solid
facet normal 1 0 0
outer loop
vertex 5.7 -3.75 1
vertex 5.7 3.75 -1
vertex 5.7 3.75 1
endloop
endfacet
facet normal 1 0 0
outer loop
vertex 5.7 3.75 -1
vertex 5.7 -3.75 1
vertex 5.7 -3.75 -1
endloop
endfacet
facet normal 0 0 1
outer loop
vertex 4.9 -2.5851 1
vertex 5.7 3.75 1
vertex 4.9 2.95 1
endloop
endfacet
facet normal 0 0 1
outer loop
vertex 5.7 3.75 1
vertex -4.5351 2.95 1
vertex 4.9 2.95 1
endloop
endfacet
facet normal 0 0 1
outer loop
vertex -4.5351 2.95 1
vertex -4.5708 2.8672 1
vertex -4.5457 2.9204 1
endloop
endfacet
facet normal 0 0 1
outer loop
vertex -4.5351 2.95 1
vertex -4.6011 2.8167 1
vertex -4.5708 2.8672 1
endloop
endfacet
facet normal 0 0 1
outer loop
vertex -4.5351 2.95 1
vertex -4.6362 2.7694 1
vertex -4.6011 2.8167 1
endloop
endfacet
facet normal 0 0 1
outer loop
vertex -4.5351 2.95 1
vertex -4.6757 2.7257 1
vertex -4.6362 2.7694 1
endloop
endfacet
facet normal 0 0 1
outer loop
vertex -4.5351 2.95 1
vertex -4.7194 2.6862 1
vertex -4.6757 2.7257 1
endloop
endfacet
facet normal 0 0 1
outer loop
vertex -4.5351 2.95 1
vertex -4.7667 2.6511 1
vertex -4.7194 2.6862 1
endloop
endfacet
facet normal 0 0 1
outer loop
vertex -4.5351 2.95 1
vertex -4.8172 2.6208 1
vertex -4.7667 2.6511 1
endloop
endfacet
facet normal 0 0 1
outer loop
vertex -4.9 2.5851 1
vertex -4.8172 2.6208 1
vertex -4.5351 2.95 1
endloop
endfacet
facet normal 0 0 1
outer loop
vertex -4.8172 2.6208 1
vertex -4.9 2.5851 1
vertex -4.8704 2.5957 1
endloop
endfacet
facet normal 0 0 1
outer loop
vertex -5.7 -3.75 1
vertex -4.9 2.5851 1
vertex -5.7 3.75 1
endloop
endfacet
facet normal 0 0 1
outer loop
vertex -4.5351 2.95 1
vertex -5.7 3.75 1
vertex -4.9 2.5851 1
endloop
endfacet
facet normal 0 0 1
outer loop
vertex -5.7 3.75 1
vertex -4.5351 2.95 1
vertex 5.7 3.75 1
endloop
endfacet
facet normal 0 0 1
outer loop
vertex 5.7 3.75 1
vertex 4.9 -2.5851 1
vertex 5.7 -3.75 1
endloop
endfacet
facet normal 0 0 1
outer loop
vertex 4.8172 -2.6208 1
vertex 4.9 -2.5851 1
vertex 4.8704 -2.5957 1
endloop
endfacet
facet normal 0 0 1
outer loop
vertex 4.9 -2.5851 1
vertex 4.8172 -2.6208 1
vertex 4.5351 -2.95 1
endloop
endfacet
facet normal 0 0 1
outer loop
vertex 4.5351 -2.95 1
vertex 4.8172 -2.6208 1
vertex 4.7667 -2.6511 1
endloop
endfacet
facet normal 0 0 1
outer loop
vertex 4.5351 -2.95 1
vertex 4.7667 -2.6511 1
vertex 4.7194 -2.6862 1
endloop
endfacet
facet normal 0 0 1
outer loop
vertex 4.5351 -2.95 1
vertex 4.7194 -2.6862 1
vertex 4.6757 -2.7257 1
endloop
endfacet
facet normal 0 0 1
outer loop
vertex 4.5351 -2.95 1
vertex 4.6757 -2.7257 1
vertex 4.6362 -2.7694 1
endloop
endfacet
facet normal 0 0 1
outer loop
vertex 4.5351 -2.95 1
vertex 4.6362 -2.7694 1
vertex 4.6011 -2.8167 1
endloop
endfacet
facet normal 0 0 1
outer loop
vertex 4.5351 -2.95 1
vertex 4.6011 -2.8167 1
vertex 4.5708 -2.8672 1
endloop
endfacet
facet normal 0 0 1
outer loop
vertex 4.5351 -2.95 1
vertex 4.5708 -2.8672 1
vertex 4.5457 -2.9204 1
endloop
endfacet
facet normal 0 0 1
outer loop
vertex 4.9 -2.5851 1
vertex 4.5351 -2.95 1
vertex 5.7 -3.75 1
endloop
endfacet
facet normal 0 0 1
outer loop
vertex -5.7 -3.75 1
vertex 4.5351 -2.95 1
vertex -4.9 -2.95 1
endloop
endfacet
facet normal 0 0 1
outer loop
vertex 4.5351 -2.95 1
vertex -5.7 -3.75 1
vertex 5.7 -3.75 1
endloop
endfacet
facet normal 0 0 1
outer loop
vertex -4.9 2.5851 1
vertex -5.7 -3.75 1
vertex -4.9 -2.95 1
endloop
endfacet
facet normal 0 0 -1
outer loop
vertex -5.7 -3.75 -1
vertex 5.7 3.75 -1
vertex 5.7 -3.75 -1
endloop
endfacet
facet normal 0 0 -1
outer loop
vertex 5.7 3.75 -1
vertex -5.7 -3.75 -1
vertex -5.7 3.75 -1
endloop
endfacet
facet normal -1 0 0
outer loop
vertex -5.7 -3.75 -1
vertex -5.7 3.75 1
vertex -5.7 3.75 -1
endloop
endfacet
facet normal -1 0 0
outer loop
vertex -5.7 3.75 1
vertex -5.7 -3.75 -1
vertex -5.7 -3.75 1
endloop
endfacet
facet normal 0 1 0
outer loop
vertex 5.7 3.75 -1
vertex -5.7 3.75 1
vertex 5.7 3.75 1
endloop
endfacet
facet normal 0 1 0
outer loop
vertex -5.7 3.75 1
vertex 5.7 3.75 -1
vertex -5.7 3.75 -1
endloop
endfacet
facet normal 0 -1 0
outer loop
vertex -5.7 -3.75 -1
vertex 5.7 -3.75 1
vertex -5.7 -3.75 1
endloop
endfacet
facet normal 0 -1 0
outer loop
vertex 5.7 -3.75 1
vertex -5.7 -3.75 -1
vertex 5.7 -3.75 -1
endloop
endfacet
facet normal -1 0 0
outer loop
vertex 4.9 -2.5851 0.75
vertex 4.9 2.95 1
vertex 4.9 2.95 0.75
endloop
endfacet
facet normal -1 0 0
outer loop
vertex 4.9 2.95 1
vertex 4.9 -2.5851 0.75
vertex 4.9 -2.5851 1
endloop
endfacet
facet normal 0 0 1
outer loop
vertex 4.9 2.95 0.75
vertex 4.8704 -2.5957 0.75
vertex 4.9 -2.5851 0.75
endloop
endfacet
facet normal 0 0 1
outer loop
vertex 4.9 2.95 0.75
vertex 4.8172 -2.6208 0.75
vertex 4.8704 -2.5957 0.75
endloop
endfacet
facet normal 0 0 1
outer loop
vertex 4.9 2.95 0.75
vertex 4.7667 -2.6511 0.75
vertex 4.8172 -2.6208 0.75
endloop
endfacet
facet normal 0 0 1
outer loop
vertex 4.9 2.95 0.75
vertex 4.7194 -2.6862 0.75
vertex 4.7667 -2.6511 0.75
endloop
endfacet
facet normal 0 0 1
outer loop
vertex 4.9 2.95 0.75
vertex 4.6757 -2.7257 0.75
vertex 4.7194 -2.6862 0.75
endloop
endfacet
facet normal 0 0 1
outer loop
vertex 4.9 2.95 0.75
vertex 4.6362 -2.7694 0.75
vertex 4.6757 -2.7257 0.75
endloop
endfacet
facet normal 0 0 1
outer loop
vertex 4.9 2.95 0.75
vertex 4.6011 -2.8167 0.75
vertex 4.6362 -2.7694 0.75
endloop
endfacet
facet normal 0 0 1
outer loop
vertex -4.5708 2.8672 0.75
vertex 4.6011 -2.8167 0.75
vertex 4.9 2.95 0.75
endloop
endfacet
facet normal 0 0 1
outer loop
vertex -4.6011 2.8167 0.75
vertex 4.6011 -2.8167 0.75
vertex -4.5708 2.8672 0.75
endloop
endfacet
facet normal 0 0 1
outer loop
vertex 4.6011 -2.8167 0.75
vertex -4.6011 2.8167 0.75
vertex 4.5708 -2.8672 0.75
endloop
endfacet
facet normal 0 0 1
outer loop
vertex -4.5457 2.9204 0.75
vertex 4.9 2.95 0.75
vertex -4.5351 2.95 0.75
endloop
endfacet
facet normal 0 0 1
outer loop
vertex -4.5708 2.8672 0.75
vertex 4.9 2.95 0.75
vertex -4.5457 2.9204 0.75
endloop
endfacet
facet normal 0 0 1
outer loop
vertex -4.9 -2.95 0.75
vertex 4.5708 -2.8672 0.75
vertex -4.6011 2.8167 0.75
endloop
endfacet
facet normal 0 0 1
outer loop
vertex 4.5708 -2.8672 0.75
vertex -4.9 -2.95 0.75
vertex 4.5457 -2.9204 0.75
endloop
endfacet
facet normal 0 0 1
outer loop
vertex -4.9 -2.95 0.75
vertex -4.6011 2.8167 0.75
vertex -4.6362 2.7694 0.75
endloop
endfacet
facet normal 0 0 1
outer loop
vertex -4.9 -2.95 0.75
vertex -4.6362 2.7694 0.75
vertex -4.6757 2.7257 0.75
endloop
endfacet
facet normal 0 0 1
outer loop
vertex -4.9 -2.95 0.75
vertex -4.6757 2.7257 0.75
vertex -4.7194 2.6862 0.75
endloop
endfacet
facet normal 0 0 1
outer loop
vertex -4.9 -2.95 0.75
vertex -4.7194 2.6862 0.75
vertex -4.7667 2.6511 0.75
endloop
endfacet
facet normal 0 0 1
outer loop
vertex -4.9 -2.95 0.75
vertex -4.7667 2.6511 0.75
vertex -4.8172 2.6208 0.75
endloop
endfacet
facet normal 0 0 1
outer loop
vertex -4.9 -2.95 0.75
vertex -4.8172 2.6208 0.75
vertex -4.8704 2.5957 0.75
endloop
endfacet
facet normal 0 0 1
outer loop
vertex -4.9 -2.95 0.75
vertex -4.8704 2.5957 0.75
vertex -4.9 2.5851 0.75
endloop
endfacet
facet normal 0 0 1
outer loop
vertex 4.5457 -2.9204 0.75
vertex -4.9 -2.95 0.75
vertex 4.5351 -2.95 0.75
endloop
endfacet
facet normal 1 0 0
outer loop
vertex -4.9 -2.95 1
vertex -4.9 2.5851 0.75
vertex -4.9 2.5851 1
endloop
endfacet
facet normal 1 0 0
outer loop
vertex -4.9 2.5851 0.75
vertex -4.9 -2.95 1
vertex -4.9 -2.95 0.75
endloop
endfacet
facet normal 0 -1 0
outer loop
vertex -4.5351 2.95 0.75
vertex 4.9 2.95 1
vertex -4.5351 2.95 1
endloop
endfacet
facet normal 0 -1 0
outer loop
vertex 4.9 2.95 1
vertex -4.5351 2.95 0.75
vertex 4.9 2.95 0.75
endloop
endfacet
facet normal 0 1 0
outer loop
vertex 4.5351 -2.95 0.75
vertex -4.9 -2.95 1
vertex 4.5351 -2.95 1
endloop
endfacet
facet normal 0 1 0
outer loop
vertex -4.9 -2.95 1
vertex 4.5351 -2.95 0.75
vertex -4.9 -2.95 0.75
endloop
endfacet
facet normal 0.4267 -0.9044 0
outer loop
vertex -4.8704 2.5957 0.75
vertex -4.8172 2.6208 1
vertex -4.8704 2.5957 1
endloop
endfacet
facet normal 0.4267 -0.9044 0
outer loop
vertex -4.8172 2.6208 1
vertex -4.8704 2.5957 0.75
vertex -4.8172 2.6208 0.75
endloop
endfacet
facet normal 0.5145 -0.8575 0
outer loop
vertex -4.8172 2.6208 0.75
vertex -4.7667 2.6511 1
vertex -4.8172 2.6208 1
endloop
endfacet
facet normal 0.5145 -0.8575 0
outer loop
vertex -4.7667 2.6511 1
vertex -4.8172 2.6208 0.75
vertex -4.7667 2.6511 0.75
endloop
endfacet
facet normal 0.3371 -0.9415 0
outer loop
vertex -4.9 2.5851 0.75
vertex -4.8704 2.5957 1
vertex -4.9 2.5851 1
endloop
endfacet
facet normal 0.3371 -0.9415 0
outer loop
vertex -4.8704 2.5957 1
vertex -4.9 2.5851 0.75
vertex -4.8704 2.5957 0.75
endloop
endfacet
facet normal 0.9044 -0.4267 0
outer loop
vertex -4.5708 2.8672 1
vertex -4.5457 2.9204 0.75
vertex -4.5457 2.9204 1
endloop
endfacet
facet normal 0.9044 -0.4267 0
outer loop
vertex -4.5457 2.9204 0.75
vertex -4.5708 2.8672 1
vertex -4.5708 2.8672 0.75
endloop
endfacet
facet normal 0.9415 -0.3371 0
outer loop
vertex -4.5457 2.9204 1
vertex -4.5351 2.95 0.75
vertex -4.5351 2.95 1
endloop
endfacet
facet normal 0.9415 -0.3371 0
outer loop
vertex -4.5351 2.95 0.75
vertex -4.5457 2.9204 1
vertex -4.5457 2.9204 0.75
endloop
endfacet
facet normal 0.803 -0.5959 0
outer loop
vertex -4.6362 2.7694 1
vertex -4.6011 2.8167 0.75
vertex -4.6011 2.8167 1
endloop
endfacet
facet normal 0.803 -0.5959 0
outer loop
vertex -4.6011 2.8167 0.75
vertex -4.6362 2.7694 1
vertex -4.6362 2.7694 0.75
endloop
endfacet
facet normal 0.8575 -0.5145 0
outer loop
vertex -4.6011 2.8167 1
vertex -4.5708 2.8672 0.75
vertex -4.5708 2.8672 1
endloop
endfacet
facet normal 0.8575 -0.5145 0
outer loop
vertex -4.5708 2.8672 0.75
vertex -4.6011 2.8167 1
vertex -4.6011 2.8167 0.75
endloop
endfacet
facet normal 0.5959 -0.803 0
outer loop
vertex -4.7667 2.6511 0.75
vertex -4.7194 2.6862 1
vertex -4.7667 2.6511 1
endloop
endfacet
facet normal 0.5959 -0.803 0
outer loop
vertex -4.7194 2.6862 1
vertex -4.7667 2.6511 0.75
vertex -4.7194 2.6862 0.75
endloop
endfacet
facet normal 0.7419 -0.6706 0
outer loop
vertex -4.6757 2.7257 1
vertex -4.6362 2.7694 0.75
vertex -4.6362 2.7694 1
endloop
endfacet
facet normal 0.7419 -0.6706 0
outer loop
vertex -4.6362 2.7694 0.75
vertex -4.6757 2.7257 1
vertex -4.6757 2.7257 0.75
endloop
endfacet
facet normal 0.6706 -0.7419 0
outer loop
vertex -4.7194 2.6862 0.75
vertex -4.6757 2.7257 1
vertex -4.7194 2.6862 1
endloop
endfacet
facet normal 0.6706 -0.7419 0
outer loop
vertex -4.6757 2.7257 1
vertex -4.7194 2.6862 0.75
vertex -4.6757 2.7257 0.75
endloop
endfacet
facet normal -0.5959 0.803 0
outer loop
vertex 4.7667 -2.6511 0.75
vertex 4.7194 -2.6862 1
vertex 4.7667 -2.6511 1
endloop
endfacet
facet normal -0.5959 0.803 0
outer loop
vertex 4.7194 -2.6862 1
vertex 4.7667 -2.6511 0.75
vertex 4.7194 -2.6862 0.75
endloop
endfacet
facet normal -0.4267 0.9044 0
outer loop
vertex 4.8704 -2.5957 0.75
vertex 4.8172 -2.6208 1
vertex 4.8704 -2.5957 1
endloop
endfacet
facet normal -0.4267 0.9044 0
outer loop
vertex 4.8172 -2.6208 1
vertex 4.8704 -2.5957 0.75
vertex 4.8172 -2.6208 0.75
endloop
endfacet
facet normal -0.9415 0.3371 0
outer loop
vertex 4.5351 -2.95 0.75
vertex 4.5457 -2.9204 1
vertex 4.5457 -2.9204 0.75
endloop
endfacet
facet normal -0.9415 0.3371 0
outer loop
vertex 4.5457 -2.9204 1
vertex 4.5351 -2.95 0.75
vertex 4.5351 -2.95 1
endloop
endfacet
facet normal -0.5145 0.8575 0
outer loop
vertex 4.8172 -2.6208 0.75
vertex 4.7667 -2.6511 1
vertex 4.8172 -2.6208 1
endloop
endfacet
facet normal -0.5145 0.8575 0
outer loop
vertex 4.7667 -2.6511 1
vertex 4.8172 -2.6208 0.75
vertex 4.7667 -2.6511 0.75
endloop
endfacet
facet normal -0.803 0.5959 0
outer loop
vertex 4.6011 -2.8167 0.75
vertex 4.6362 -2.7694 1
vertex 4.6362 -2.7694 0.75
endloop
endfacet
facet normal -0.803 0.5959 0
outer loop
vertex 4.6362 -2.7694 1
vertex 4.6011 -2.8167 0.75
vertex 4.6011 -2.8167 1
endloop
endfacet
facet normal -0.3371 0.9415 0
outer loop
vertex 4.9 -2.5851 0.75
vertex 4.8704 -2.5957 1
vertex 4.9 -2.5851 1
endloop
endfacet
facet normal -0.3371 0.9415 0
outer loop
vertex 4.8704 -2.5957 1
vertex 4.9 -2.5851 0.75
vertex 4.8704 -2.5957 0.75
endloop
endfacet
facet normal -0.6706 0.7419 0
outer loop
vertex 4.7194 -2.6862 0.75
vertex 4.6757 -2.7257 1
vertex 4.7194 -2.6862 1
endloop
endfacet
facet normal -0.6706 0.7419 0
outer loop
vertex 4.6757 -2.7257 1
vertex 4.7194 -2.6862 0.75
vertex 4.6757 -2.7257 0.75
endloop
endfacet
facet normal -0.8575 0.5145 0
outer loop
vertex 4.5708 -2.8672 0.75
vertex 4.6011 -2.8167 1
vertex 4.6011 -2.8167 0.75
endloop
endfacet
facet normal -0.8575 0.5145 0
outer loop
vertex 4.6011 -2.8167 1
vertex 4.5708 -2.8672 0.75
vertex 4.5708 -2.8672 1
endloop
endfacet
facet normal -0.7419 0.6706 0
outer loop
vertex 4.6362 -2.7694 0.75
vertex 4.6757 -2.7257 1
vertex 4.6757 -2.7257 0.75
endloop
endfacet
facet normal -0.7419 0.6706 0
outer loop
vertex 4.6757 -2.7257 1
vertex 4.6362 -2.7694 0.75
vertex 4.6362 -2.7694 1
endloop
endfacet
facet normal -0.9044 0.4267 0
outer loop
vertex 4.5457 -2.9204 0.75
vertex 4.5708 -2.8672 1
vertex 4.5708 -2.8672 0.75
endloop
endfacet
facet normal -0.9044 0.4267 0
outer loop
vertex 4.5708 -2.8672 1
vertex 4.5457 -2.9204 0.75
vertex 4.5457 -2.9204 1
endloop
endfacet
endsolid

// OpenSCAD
// SMD package target overall: [11.40, 7.50, 2.00] (L x W x H)
// One connected solid. Simple body + two end terminations + two corner bumps (as seen in orthographic views).

// ---------- Parameters ----------
L = 11.40;
W = 7.50;
H = 2.00;

// Inner "top" inset (visual feature seen in side/front/back/left/right views)
inset_margin = 0.80;     // frame thickness around inset
inset_depth  = 0.25;     // depth of inset from top surface

// End terminations (kept within overall length; no protrusion beyond L)
term_len   = 1.60;       // along X
term_w     = 6.20;       // along Y
term_thk   = 0.25;       // along Z (bottom pads)

// Corner bumps (small circular protrusions seen in views)
bump_r = 0.60;
bump_h = 0.25;           // height of bump (kept within overall height)

// Connectivity overlap (ensures single connected solid)
overlap = 0.20;
eps = 0.02;
$fn = 64;

// ---------- Helpers ----------
function clamp(v, lo, hi) = v < lo ? lo : (v > hi ? hi : v);

// Inset size (must remain positive)
inset_L = clamp(L - 2*inset_margin, 0.1, L);
inset_W = clamp(W - 2*inset_margin, 0.1, W);
inset_depth_c = clamp(inset_depth, 0, H);

// Termination placement (fully inside overall length)
term_xL = -L/2 + term_len/2;
term_xR =  L/2 - term_len/2;

// Bottom pad Z placement: slightly overlaps into body
term_z = -H/2 + term_thk/2 + overlap/2;

// Bump Z placement: on top surface, slightly overlapping into body
bump_z = H/2 - bump_h/2 - overlap/2;

// Corner bump XY positions (at corners, slightly inset so they don't exceed overall footprint)
bump_inset = bump_r; // keeps bump within L/W
bump_xy = [
  [-L/2 + bump_inset,  W/2 - bump_inset], // top-left
  [ L/2 - bump_inset, -W/2 + bump_inset]  // bottom-right
];

// ---------- Geometry ----------
module body_main() {
  cube([L, W, H], center=true);
}

module top_inset_cut() {
  translate([0, 0, H/2 - inset_depth_c/2 + eps/2])
    cube([inset_L, inset_W, inset_depth_c + eps], center=true);
}

module termination(xc) {
  translate([xc, 0, term_z])
    cube([term_len, term_w, term_thk + overlap], center=true);
}

module terminations() {
  union() {
    termination(term_xL);
    termination(term_xR);
  }
}

module corner_bumps() {
  union() {
    for (p = bump_xy)
      translate([p[0], p[1], bump_z])
        cylinder(r=bump_r, h=bump_h + overlap, center=true);
  }
}

// ---------- Final (ONE connected solid) ----------
union() {
  difference() {
    body_main();
    top_inset_cut();
  }
  terminations();
  corner_bumps();
}
